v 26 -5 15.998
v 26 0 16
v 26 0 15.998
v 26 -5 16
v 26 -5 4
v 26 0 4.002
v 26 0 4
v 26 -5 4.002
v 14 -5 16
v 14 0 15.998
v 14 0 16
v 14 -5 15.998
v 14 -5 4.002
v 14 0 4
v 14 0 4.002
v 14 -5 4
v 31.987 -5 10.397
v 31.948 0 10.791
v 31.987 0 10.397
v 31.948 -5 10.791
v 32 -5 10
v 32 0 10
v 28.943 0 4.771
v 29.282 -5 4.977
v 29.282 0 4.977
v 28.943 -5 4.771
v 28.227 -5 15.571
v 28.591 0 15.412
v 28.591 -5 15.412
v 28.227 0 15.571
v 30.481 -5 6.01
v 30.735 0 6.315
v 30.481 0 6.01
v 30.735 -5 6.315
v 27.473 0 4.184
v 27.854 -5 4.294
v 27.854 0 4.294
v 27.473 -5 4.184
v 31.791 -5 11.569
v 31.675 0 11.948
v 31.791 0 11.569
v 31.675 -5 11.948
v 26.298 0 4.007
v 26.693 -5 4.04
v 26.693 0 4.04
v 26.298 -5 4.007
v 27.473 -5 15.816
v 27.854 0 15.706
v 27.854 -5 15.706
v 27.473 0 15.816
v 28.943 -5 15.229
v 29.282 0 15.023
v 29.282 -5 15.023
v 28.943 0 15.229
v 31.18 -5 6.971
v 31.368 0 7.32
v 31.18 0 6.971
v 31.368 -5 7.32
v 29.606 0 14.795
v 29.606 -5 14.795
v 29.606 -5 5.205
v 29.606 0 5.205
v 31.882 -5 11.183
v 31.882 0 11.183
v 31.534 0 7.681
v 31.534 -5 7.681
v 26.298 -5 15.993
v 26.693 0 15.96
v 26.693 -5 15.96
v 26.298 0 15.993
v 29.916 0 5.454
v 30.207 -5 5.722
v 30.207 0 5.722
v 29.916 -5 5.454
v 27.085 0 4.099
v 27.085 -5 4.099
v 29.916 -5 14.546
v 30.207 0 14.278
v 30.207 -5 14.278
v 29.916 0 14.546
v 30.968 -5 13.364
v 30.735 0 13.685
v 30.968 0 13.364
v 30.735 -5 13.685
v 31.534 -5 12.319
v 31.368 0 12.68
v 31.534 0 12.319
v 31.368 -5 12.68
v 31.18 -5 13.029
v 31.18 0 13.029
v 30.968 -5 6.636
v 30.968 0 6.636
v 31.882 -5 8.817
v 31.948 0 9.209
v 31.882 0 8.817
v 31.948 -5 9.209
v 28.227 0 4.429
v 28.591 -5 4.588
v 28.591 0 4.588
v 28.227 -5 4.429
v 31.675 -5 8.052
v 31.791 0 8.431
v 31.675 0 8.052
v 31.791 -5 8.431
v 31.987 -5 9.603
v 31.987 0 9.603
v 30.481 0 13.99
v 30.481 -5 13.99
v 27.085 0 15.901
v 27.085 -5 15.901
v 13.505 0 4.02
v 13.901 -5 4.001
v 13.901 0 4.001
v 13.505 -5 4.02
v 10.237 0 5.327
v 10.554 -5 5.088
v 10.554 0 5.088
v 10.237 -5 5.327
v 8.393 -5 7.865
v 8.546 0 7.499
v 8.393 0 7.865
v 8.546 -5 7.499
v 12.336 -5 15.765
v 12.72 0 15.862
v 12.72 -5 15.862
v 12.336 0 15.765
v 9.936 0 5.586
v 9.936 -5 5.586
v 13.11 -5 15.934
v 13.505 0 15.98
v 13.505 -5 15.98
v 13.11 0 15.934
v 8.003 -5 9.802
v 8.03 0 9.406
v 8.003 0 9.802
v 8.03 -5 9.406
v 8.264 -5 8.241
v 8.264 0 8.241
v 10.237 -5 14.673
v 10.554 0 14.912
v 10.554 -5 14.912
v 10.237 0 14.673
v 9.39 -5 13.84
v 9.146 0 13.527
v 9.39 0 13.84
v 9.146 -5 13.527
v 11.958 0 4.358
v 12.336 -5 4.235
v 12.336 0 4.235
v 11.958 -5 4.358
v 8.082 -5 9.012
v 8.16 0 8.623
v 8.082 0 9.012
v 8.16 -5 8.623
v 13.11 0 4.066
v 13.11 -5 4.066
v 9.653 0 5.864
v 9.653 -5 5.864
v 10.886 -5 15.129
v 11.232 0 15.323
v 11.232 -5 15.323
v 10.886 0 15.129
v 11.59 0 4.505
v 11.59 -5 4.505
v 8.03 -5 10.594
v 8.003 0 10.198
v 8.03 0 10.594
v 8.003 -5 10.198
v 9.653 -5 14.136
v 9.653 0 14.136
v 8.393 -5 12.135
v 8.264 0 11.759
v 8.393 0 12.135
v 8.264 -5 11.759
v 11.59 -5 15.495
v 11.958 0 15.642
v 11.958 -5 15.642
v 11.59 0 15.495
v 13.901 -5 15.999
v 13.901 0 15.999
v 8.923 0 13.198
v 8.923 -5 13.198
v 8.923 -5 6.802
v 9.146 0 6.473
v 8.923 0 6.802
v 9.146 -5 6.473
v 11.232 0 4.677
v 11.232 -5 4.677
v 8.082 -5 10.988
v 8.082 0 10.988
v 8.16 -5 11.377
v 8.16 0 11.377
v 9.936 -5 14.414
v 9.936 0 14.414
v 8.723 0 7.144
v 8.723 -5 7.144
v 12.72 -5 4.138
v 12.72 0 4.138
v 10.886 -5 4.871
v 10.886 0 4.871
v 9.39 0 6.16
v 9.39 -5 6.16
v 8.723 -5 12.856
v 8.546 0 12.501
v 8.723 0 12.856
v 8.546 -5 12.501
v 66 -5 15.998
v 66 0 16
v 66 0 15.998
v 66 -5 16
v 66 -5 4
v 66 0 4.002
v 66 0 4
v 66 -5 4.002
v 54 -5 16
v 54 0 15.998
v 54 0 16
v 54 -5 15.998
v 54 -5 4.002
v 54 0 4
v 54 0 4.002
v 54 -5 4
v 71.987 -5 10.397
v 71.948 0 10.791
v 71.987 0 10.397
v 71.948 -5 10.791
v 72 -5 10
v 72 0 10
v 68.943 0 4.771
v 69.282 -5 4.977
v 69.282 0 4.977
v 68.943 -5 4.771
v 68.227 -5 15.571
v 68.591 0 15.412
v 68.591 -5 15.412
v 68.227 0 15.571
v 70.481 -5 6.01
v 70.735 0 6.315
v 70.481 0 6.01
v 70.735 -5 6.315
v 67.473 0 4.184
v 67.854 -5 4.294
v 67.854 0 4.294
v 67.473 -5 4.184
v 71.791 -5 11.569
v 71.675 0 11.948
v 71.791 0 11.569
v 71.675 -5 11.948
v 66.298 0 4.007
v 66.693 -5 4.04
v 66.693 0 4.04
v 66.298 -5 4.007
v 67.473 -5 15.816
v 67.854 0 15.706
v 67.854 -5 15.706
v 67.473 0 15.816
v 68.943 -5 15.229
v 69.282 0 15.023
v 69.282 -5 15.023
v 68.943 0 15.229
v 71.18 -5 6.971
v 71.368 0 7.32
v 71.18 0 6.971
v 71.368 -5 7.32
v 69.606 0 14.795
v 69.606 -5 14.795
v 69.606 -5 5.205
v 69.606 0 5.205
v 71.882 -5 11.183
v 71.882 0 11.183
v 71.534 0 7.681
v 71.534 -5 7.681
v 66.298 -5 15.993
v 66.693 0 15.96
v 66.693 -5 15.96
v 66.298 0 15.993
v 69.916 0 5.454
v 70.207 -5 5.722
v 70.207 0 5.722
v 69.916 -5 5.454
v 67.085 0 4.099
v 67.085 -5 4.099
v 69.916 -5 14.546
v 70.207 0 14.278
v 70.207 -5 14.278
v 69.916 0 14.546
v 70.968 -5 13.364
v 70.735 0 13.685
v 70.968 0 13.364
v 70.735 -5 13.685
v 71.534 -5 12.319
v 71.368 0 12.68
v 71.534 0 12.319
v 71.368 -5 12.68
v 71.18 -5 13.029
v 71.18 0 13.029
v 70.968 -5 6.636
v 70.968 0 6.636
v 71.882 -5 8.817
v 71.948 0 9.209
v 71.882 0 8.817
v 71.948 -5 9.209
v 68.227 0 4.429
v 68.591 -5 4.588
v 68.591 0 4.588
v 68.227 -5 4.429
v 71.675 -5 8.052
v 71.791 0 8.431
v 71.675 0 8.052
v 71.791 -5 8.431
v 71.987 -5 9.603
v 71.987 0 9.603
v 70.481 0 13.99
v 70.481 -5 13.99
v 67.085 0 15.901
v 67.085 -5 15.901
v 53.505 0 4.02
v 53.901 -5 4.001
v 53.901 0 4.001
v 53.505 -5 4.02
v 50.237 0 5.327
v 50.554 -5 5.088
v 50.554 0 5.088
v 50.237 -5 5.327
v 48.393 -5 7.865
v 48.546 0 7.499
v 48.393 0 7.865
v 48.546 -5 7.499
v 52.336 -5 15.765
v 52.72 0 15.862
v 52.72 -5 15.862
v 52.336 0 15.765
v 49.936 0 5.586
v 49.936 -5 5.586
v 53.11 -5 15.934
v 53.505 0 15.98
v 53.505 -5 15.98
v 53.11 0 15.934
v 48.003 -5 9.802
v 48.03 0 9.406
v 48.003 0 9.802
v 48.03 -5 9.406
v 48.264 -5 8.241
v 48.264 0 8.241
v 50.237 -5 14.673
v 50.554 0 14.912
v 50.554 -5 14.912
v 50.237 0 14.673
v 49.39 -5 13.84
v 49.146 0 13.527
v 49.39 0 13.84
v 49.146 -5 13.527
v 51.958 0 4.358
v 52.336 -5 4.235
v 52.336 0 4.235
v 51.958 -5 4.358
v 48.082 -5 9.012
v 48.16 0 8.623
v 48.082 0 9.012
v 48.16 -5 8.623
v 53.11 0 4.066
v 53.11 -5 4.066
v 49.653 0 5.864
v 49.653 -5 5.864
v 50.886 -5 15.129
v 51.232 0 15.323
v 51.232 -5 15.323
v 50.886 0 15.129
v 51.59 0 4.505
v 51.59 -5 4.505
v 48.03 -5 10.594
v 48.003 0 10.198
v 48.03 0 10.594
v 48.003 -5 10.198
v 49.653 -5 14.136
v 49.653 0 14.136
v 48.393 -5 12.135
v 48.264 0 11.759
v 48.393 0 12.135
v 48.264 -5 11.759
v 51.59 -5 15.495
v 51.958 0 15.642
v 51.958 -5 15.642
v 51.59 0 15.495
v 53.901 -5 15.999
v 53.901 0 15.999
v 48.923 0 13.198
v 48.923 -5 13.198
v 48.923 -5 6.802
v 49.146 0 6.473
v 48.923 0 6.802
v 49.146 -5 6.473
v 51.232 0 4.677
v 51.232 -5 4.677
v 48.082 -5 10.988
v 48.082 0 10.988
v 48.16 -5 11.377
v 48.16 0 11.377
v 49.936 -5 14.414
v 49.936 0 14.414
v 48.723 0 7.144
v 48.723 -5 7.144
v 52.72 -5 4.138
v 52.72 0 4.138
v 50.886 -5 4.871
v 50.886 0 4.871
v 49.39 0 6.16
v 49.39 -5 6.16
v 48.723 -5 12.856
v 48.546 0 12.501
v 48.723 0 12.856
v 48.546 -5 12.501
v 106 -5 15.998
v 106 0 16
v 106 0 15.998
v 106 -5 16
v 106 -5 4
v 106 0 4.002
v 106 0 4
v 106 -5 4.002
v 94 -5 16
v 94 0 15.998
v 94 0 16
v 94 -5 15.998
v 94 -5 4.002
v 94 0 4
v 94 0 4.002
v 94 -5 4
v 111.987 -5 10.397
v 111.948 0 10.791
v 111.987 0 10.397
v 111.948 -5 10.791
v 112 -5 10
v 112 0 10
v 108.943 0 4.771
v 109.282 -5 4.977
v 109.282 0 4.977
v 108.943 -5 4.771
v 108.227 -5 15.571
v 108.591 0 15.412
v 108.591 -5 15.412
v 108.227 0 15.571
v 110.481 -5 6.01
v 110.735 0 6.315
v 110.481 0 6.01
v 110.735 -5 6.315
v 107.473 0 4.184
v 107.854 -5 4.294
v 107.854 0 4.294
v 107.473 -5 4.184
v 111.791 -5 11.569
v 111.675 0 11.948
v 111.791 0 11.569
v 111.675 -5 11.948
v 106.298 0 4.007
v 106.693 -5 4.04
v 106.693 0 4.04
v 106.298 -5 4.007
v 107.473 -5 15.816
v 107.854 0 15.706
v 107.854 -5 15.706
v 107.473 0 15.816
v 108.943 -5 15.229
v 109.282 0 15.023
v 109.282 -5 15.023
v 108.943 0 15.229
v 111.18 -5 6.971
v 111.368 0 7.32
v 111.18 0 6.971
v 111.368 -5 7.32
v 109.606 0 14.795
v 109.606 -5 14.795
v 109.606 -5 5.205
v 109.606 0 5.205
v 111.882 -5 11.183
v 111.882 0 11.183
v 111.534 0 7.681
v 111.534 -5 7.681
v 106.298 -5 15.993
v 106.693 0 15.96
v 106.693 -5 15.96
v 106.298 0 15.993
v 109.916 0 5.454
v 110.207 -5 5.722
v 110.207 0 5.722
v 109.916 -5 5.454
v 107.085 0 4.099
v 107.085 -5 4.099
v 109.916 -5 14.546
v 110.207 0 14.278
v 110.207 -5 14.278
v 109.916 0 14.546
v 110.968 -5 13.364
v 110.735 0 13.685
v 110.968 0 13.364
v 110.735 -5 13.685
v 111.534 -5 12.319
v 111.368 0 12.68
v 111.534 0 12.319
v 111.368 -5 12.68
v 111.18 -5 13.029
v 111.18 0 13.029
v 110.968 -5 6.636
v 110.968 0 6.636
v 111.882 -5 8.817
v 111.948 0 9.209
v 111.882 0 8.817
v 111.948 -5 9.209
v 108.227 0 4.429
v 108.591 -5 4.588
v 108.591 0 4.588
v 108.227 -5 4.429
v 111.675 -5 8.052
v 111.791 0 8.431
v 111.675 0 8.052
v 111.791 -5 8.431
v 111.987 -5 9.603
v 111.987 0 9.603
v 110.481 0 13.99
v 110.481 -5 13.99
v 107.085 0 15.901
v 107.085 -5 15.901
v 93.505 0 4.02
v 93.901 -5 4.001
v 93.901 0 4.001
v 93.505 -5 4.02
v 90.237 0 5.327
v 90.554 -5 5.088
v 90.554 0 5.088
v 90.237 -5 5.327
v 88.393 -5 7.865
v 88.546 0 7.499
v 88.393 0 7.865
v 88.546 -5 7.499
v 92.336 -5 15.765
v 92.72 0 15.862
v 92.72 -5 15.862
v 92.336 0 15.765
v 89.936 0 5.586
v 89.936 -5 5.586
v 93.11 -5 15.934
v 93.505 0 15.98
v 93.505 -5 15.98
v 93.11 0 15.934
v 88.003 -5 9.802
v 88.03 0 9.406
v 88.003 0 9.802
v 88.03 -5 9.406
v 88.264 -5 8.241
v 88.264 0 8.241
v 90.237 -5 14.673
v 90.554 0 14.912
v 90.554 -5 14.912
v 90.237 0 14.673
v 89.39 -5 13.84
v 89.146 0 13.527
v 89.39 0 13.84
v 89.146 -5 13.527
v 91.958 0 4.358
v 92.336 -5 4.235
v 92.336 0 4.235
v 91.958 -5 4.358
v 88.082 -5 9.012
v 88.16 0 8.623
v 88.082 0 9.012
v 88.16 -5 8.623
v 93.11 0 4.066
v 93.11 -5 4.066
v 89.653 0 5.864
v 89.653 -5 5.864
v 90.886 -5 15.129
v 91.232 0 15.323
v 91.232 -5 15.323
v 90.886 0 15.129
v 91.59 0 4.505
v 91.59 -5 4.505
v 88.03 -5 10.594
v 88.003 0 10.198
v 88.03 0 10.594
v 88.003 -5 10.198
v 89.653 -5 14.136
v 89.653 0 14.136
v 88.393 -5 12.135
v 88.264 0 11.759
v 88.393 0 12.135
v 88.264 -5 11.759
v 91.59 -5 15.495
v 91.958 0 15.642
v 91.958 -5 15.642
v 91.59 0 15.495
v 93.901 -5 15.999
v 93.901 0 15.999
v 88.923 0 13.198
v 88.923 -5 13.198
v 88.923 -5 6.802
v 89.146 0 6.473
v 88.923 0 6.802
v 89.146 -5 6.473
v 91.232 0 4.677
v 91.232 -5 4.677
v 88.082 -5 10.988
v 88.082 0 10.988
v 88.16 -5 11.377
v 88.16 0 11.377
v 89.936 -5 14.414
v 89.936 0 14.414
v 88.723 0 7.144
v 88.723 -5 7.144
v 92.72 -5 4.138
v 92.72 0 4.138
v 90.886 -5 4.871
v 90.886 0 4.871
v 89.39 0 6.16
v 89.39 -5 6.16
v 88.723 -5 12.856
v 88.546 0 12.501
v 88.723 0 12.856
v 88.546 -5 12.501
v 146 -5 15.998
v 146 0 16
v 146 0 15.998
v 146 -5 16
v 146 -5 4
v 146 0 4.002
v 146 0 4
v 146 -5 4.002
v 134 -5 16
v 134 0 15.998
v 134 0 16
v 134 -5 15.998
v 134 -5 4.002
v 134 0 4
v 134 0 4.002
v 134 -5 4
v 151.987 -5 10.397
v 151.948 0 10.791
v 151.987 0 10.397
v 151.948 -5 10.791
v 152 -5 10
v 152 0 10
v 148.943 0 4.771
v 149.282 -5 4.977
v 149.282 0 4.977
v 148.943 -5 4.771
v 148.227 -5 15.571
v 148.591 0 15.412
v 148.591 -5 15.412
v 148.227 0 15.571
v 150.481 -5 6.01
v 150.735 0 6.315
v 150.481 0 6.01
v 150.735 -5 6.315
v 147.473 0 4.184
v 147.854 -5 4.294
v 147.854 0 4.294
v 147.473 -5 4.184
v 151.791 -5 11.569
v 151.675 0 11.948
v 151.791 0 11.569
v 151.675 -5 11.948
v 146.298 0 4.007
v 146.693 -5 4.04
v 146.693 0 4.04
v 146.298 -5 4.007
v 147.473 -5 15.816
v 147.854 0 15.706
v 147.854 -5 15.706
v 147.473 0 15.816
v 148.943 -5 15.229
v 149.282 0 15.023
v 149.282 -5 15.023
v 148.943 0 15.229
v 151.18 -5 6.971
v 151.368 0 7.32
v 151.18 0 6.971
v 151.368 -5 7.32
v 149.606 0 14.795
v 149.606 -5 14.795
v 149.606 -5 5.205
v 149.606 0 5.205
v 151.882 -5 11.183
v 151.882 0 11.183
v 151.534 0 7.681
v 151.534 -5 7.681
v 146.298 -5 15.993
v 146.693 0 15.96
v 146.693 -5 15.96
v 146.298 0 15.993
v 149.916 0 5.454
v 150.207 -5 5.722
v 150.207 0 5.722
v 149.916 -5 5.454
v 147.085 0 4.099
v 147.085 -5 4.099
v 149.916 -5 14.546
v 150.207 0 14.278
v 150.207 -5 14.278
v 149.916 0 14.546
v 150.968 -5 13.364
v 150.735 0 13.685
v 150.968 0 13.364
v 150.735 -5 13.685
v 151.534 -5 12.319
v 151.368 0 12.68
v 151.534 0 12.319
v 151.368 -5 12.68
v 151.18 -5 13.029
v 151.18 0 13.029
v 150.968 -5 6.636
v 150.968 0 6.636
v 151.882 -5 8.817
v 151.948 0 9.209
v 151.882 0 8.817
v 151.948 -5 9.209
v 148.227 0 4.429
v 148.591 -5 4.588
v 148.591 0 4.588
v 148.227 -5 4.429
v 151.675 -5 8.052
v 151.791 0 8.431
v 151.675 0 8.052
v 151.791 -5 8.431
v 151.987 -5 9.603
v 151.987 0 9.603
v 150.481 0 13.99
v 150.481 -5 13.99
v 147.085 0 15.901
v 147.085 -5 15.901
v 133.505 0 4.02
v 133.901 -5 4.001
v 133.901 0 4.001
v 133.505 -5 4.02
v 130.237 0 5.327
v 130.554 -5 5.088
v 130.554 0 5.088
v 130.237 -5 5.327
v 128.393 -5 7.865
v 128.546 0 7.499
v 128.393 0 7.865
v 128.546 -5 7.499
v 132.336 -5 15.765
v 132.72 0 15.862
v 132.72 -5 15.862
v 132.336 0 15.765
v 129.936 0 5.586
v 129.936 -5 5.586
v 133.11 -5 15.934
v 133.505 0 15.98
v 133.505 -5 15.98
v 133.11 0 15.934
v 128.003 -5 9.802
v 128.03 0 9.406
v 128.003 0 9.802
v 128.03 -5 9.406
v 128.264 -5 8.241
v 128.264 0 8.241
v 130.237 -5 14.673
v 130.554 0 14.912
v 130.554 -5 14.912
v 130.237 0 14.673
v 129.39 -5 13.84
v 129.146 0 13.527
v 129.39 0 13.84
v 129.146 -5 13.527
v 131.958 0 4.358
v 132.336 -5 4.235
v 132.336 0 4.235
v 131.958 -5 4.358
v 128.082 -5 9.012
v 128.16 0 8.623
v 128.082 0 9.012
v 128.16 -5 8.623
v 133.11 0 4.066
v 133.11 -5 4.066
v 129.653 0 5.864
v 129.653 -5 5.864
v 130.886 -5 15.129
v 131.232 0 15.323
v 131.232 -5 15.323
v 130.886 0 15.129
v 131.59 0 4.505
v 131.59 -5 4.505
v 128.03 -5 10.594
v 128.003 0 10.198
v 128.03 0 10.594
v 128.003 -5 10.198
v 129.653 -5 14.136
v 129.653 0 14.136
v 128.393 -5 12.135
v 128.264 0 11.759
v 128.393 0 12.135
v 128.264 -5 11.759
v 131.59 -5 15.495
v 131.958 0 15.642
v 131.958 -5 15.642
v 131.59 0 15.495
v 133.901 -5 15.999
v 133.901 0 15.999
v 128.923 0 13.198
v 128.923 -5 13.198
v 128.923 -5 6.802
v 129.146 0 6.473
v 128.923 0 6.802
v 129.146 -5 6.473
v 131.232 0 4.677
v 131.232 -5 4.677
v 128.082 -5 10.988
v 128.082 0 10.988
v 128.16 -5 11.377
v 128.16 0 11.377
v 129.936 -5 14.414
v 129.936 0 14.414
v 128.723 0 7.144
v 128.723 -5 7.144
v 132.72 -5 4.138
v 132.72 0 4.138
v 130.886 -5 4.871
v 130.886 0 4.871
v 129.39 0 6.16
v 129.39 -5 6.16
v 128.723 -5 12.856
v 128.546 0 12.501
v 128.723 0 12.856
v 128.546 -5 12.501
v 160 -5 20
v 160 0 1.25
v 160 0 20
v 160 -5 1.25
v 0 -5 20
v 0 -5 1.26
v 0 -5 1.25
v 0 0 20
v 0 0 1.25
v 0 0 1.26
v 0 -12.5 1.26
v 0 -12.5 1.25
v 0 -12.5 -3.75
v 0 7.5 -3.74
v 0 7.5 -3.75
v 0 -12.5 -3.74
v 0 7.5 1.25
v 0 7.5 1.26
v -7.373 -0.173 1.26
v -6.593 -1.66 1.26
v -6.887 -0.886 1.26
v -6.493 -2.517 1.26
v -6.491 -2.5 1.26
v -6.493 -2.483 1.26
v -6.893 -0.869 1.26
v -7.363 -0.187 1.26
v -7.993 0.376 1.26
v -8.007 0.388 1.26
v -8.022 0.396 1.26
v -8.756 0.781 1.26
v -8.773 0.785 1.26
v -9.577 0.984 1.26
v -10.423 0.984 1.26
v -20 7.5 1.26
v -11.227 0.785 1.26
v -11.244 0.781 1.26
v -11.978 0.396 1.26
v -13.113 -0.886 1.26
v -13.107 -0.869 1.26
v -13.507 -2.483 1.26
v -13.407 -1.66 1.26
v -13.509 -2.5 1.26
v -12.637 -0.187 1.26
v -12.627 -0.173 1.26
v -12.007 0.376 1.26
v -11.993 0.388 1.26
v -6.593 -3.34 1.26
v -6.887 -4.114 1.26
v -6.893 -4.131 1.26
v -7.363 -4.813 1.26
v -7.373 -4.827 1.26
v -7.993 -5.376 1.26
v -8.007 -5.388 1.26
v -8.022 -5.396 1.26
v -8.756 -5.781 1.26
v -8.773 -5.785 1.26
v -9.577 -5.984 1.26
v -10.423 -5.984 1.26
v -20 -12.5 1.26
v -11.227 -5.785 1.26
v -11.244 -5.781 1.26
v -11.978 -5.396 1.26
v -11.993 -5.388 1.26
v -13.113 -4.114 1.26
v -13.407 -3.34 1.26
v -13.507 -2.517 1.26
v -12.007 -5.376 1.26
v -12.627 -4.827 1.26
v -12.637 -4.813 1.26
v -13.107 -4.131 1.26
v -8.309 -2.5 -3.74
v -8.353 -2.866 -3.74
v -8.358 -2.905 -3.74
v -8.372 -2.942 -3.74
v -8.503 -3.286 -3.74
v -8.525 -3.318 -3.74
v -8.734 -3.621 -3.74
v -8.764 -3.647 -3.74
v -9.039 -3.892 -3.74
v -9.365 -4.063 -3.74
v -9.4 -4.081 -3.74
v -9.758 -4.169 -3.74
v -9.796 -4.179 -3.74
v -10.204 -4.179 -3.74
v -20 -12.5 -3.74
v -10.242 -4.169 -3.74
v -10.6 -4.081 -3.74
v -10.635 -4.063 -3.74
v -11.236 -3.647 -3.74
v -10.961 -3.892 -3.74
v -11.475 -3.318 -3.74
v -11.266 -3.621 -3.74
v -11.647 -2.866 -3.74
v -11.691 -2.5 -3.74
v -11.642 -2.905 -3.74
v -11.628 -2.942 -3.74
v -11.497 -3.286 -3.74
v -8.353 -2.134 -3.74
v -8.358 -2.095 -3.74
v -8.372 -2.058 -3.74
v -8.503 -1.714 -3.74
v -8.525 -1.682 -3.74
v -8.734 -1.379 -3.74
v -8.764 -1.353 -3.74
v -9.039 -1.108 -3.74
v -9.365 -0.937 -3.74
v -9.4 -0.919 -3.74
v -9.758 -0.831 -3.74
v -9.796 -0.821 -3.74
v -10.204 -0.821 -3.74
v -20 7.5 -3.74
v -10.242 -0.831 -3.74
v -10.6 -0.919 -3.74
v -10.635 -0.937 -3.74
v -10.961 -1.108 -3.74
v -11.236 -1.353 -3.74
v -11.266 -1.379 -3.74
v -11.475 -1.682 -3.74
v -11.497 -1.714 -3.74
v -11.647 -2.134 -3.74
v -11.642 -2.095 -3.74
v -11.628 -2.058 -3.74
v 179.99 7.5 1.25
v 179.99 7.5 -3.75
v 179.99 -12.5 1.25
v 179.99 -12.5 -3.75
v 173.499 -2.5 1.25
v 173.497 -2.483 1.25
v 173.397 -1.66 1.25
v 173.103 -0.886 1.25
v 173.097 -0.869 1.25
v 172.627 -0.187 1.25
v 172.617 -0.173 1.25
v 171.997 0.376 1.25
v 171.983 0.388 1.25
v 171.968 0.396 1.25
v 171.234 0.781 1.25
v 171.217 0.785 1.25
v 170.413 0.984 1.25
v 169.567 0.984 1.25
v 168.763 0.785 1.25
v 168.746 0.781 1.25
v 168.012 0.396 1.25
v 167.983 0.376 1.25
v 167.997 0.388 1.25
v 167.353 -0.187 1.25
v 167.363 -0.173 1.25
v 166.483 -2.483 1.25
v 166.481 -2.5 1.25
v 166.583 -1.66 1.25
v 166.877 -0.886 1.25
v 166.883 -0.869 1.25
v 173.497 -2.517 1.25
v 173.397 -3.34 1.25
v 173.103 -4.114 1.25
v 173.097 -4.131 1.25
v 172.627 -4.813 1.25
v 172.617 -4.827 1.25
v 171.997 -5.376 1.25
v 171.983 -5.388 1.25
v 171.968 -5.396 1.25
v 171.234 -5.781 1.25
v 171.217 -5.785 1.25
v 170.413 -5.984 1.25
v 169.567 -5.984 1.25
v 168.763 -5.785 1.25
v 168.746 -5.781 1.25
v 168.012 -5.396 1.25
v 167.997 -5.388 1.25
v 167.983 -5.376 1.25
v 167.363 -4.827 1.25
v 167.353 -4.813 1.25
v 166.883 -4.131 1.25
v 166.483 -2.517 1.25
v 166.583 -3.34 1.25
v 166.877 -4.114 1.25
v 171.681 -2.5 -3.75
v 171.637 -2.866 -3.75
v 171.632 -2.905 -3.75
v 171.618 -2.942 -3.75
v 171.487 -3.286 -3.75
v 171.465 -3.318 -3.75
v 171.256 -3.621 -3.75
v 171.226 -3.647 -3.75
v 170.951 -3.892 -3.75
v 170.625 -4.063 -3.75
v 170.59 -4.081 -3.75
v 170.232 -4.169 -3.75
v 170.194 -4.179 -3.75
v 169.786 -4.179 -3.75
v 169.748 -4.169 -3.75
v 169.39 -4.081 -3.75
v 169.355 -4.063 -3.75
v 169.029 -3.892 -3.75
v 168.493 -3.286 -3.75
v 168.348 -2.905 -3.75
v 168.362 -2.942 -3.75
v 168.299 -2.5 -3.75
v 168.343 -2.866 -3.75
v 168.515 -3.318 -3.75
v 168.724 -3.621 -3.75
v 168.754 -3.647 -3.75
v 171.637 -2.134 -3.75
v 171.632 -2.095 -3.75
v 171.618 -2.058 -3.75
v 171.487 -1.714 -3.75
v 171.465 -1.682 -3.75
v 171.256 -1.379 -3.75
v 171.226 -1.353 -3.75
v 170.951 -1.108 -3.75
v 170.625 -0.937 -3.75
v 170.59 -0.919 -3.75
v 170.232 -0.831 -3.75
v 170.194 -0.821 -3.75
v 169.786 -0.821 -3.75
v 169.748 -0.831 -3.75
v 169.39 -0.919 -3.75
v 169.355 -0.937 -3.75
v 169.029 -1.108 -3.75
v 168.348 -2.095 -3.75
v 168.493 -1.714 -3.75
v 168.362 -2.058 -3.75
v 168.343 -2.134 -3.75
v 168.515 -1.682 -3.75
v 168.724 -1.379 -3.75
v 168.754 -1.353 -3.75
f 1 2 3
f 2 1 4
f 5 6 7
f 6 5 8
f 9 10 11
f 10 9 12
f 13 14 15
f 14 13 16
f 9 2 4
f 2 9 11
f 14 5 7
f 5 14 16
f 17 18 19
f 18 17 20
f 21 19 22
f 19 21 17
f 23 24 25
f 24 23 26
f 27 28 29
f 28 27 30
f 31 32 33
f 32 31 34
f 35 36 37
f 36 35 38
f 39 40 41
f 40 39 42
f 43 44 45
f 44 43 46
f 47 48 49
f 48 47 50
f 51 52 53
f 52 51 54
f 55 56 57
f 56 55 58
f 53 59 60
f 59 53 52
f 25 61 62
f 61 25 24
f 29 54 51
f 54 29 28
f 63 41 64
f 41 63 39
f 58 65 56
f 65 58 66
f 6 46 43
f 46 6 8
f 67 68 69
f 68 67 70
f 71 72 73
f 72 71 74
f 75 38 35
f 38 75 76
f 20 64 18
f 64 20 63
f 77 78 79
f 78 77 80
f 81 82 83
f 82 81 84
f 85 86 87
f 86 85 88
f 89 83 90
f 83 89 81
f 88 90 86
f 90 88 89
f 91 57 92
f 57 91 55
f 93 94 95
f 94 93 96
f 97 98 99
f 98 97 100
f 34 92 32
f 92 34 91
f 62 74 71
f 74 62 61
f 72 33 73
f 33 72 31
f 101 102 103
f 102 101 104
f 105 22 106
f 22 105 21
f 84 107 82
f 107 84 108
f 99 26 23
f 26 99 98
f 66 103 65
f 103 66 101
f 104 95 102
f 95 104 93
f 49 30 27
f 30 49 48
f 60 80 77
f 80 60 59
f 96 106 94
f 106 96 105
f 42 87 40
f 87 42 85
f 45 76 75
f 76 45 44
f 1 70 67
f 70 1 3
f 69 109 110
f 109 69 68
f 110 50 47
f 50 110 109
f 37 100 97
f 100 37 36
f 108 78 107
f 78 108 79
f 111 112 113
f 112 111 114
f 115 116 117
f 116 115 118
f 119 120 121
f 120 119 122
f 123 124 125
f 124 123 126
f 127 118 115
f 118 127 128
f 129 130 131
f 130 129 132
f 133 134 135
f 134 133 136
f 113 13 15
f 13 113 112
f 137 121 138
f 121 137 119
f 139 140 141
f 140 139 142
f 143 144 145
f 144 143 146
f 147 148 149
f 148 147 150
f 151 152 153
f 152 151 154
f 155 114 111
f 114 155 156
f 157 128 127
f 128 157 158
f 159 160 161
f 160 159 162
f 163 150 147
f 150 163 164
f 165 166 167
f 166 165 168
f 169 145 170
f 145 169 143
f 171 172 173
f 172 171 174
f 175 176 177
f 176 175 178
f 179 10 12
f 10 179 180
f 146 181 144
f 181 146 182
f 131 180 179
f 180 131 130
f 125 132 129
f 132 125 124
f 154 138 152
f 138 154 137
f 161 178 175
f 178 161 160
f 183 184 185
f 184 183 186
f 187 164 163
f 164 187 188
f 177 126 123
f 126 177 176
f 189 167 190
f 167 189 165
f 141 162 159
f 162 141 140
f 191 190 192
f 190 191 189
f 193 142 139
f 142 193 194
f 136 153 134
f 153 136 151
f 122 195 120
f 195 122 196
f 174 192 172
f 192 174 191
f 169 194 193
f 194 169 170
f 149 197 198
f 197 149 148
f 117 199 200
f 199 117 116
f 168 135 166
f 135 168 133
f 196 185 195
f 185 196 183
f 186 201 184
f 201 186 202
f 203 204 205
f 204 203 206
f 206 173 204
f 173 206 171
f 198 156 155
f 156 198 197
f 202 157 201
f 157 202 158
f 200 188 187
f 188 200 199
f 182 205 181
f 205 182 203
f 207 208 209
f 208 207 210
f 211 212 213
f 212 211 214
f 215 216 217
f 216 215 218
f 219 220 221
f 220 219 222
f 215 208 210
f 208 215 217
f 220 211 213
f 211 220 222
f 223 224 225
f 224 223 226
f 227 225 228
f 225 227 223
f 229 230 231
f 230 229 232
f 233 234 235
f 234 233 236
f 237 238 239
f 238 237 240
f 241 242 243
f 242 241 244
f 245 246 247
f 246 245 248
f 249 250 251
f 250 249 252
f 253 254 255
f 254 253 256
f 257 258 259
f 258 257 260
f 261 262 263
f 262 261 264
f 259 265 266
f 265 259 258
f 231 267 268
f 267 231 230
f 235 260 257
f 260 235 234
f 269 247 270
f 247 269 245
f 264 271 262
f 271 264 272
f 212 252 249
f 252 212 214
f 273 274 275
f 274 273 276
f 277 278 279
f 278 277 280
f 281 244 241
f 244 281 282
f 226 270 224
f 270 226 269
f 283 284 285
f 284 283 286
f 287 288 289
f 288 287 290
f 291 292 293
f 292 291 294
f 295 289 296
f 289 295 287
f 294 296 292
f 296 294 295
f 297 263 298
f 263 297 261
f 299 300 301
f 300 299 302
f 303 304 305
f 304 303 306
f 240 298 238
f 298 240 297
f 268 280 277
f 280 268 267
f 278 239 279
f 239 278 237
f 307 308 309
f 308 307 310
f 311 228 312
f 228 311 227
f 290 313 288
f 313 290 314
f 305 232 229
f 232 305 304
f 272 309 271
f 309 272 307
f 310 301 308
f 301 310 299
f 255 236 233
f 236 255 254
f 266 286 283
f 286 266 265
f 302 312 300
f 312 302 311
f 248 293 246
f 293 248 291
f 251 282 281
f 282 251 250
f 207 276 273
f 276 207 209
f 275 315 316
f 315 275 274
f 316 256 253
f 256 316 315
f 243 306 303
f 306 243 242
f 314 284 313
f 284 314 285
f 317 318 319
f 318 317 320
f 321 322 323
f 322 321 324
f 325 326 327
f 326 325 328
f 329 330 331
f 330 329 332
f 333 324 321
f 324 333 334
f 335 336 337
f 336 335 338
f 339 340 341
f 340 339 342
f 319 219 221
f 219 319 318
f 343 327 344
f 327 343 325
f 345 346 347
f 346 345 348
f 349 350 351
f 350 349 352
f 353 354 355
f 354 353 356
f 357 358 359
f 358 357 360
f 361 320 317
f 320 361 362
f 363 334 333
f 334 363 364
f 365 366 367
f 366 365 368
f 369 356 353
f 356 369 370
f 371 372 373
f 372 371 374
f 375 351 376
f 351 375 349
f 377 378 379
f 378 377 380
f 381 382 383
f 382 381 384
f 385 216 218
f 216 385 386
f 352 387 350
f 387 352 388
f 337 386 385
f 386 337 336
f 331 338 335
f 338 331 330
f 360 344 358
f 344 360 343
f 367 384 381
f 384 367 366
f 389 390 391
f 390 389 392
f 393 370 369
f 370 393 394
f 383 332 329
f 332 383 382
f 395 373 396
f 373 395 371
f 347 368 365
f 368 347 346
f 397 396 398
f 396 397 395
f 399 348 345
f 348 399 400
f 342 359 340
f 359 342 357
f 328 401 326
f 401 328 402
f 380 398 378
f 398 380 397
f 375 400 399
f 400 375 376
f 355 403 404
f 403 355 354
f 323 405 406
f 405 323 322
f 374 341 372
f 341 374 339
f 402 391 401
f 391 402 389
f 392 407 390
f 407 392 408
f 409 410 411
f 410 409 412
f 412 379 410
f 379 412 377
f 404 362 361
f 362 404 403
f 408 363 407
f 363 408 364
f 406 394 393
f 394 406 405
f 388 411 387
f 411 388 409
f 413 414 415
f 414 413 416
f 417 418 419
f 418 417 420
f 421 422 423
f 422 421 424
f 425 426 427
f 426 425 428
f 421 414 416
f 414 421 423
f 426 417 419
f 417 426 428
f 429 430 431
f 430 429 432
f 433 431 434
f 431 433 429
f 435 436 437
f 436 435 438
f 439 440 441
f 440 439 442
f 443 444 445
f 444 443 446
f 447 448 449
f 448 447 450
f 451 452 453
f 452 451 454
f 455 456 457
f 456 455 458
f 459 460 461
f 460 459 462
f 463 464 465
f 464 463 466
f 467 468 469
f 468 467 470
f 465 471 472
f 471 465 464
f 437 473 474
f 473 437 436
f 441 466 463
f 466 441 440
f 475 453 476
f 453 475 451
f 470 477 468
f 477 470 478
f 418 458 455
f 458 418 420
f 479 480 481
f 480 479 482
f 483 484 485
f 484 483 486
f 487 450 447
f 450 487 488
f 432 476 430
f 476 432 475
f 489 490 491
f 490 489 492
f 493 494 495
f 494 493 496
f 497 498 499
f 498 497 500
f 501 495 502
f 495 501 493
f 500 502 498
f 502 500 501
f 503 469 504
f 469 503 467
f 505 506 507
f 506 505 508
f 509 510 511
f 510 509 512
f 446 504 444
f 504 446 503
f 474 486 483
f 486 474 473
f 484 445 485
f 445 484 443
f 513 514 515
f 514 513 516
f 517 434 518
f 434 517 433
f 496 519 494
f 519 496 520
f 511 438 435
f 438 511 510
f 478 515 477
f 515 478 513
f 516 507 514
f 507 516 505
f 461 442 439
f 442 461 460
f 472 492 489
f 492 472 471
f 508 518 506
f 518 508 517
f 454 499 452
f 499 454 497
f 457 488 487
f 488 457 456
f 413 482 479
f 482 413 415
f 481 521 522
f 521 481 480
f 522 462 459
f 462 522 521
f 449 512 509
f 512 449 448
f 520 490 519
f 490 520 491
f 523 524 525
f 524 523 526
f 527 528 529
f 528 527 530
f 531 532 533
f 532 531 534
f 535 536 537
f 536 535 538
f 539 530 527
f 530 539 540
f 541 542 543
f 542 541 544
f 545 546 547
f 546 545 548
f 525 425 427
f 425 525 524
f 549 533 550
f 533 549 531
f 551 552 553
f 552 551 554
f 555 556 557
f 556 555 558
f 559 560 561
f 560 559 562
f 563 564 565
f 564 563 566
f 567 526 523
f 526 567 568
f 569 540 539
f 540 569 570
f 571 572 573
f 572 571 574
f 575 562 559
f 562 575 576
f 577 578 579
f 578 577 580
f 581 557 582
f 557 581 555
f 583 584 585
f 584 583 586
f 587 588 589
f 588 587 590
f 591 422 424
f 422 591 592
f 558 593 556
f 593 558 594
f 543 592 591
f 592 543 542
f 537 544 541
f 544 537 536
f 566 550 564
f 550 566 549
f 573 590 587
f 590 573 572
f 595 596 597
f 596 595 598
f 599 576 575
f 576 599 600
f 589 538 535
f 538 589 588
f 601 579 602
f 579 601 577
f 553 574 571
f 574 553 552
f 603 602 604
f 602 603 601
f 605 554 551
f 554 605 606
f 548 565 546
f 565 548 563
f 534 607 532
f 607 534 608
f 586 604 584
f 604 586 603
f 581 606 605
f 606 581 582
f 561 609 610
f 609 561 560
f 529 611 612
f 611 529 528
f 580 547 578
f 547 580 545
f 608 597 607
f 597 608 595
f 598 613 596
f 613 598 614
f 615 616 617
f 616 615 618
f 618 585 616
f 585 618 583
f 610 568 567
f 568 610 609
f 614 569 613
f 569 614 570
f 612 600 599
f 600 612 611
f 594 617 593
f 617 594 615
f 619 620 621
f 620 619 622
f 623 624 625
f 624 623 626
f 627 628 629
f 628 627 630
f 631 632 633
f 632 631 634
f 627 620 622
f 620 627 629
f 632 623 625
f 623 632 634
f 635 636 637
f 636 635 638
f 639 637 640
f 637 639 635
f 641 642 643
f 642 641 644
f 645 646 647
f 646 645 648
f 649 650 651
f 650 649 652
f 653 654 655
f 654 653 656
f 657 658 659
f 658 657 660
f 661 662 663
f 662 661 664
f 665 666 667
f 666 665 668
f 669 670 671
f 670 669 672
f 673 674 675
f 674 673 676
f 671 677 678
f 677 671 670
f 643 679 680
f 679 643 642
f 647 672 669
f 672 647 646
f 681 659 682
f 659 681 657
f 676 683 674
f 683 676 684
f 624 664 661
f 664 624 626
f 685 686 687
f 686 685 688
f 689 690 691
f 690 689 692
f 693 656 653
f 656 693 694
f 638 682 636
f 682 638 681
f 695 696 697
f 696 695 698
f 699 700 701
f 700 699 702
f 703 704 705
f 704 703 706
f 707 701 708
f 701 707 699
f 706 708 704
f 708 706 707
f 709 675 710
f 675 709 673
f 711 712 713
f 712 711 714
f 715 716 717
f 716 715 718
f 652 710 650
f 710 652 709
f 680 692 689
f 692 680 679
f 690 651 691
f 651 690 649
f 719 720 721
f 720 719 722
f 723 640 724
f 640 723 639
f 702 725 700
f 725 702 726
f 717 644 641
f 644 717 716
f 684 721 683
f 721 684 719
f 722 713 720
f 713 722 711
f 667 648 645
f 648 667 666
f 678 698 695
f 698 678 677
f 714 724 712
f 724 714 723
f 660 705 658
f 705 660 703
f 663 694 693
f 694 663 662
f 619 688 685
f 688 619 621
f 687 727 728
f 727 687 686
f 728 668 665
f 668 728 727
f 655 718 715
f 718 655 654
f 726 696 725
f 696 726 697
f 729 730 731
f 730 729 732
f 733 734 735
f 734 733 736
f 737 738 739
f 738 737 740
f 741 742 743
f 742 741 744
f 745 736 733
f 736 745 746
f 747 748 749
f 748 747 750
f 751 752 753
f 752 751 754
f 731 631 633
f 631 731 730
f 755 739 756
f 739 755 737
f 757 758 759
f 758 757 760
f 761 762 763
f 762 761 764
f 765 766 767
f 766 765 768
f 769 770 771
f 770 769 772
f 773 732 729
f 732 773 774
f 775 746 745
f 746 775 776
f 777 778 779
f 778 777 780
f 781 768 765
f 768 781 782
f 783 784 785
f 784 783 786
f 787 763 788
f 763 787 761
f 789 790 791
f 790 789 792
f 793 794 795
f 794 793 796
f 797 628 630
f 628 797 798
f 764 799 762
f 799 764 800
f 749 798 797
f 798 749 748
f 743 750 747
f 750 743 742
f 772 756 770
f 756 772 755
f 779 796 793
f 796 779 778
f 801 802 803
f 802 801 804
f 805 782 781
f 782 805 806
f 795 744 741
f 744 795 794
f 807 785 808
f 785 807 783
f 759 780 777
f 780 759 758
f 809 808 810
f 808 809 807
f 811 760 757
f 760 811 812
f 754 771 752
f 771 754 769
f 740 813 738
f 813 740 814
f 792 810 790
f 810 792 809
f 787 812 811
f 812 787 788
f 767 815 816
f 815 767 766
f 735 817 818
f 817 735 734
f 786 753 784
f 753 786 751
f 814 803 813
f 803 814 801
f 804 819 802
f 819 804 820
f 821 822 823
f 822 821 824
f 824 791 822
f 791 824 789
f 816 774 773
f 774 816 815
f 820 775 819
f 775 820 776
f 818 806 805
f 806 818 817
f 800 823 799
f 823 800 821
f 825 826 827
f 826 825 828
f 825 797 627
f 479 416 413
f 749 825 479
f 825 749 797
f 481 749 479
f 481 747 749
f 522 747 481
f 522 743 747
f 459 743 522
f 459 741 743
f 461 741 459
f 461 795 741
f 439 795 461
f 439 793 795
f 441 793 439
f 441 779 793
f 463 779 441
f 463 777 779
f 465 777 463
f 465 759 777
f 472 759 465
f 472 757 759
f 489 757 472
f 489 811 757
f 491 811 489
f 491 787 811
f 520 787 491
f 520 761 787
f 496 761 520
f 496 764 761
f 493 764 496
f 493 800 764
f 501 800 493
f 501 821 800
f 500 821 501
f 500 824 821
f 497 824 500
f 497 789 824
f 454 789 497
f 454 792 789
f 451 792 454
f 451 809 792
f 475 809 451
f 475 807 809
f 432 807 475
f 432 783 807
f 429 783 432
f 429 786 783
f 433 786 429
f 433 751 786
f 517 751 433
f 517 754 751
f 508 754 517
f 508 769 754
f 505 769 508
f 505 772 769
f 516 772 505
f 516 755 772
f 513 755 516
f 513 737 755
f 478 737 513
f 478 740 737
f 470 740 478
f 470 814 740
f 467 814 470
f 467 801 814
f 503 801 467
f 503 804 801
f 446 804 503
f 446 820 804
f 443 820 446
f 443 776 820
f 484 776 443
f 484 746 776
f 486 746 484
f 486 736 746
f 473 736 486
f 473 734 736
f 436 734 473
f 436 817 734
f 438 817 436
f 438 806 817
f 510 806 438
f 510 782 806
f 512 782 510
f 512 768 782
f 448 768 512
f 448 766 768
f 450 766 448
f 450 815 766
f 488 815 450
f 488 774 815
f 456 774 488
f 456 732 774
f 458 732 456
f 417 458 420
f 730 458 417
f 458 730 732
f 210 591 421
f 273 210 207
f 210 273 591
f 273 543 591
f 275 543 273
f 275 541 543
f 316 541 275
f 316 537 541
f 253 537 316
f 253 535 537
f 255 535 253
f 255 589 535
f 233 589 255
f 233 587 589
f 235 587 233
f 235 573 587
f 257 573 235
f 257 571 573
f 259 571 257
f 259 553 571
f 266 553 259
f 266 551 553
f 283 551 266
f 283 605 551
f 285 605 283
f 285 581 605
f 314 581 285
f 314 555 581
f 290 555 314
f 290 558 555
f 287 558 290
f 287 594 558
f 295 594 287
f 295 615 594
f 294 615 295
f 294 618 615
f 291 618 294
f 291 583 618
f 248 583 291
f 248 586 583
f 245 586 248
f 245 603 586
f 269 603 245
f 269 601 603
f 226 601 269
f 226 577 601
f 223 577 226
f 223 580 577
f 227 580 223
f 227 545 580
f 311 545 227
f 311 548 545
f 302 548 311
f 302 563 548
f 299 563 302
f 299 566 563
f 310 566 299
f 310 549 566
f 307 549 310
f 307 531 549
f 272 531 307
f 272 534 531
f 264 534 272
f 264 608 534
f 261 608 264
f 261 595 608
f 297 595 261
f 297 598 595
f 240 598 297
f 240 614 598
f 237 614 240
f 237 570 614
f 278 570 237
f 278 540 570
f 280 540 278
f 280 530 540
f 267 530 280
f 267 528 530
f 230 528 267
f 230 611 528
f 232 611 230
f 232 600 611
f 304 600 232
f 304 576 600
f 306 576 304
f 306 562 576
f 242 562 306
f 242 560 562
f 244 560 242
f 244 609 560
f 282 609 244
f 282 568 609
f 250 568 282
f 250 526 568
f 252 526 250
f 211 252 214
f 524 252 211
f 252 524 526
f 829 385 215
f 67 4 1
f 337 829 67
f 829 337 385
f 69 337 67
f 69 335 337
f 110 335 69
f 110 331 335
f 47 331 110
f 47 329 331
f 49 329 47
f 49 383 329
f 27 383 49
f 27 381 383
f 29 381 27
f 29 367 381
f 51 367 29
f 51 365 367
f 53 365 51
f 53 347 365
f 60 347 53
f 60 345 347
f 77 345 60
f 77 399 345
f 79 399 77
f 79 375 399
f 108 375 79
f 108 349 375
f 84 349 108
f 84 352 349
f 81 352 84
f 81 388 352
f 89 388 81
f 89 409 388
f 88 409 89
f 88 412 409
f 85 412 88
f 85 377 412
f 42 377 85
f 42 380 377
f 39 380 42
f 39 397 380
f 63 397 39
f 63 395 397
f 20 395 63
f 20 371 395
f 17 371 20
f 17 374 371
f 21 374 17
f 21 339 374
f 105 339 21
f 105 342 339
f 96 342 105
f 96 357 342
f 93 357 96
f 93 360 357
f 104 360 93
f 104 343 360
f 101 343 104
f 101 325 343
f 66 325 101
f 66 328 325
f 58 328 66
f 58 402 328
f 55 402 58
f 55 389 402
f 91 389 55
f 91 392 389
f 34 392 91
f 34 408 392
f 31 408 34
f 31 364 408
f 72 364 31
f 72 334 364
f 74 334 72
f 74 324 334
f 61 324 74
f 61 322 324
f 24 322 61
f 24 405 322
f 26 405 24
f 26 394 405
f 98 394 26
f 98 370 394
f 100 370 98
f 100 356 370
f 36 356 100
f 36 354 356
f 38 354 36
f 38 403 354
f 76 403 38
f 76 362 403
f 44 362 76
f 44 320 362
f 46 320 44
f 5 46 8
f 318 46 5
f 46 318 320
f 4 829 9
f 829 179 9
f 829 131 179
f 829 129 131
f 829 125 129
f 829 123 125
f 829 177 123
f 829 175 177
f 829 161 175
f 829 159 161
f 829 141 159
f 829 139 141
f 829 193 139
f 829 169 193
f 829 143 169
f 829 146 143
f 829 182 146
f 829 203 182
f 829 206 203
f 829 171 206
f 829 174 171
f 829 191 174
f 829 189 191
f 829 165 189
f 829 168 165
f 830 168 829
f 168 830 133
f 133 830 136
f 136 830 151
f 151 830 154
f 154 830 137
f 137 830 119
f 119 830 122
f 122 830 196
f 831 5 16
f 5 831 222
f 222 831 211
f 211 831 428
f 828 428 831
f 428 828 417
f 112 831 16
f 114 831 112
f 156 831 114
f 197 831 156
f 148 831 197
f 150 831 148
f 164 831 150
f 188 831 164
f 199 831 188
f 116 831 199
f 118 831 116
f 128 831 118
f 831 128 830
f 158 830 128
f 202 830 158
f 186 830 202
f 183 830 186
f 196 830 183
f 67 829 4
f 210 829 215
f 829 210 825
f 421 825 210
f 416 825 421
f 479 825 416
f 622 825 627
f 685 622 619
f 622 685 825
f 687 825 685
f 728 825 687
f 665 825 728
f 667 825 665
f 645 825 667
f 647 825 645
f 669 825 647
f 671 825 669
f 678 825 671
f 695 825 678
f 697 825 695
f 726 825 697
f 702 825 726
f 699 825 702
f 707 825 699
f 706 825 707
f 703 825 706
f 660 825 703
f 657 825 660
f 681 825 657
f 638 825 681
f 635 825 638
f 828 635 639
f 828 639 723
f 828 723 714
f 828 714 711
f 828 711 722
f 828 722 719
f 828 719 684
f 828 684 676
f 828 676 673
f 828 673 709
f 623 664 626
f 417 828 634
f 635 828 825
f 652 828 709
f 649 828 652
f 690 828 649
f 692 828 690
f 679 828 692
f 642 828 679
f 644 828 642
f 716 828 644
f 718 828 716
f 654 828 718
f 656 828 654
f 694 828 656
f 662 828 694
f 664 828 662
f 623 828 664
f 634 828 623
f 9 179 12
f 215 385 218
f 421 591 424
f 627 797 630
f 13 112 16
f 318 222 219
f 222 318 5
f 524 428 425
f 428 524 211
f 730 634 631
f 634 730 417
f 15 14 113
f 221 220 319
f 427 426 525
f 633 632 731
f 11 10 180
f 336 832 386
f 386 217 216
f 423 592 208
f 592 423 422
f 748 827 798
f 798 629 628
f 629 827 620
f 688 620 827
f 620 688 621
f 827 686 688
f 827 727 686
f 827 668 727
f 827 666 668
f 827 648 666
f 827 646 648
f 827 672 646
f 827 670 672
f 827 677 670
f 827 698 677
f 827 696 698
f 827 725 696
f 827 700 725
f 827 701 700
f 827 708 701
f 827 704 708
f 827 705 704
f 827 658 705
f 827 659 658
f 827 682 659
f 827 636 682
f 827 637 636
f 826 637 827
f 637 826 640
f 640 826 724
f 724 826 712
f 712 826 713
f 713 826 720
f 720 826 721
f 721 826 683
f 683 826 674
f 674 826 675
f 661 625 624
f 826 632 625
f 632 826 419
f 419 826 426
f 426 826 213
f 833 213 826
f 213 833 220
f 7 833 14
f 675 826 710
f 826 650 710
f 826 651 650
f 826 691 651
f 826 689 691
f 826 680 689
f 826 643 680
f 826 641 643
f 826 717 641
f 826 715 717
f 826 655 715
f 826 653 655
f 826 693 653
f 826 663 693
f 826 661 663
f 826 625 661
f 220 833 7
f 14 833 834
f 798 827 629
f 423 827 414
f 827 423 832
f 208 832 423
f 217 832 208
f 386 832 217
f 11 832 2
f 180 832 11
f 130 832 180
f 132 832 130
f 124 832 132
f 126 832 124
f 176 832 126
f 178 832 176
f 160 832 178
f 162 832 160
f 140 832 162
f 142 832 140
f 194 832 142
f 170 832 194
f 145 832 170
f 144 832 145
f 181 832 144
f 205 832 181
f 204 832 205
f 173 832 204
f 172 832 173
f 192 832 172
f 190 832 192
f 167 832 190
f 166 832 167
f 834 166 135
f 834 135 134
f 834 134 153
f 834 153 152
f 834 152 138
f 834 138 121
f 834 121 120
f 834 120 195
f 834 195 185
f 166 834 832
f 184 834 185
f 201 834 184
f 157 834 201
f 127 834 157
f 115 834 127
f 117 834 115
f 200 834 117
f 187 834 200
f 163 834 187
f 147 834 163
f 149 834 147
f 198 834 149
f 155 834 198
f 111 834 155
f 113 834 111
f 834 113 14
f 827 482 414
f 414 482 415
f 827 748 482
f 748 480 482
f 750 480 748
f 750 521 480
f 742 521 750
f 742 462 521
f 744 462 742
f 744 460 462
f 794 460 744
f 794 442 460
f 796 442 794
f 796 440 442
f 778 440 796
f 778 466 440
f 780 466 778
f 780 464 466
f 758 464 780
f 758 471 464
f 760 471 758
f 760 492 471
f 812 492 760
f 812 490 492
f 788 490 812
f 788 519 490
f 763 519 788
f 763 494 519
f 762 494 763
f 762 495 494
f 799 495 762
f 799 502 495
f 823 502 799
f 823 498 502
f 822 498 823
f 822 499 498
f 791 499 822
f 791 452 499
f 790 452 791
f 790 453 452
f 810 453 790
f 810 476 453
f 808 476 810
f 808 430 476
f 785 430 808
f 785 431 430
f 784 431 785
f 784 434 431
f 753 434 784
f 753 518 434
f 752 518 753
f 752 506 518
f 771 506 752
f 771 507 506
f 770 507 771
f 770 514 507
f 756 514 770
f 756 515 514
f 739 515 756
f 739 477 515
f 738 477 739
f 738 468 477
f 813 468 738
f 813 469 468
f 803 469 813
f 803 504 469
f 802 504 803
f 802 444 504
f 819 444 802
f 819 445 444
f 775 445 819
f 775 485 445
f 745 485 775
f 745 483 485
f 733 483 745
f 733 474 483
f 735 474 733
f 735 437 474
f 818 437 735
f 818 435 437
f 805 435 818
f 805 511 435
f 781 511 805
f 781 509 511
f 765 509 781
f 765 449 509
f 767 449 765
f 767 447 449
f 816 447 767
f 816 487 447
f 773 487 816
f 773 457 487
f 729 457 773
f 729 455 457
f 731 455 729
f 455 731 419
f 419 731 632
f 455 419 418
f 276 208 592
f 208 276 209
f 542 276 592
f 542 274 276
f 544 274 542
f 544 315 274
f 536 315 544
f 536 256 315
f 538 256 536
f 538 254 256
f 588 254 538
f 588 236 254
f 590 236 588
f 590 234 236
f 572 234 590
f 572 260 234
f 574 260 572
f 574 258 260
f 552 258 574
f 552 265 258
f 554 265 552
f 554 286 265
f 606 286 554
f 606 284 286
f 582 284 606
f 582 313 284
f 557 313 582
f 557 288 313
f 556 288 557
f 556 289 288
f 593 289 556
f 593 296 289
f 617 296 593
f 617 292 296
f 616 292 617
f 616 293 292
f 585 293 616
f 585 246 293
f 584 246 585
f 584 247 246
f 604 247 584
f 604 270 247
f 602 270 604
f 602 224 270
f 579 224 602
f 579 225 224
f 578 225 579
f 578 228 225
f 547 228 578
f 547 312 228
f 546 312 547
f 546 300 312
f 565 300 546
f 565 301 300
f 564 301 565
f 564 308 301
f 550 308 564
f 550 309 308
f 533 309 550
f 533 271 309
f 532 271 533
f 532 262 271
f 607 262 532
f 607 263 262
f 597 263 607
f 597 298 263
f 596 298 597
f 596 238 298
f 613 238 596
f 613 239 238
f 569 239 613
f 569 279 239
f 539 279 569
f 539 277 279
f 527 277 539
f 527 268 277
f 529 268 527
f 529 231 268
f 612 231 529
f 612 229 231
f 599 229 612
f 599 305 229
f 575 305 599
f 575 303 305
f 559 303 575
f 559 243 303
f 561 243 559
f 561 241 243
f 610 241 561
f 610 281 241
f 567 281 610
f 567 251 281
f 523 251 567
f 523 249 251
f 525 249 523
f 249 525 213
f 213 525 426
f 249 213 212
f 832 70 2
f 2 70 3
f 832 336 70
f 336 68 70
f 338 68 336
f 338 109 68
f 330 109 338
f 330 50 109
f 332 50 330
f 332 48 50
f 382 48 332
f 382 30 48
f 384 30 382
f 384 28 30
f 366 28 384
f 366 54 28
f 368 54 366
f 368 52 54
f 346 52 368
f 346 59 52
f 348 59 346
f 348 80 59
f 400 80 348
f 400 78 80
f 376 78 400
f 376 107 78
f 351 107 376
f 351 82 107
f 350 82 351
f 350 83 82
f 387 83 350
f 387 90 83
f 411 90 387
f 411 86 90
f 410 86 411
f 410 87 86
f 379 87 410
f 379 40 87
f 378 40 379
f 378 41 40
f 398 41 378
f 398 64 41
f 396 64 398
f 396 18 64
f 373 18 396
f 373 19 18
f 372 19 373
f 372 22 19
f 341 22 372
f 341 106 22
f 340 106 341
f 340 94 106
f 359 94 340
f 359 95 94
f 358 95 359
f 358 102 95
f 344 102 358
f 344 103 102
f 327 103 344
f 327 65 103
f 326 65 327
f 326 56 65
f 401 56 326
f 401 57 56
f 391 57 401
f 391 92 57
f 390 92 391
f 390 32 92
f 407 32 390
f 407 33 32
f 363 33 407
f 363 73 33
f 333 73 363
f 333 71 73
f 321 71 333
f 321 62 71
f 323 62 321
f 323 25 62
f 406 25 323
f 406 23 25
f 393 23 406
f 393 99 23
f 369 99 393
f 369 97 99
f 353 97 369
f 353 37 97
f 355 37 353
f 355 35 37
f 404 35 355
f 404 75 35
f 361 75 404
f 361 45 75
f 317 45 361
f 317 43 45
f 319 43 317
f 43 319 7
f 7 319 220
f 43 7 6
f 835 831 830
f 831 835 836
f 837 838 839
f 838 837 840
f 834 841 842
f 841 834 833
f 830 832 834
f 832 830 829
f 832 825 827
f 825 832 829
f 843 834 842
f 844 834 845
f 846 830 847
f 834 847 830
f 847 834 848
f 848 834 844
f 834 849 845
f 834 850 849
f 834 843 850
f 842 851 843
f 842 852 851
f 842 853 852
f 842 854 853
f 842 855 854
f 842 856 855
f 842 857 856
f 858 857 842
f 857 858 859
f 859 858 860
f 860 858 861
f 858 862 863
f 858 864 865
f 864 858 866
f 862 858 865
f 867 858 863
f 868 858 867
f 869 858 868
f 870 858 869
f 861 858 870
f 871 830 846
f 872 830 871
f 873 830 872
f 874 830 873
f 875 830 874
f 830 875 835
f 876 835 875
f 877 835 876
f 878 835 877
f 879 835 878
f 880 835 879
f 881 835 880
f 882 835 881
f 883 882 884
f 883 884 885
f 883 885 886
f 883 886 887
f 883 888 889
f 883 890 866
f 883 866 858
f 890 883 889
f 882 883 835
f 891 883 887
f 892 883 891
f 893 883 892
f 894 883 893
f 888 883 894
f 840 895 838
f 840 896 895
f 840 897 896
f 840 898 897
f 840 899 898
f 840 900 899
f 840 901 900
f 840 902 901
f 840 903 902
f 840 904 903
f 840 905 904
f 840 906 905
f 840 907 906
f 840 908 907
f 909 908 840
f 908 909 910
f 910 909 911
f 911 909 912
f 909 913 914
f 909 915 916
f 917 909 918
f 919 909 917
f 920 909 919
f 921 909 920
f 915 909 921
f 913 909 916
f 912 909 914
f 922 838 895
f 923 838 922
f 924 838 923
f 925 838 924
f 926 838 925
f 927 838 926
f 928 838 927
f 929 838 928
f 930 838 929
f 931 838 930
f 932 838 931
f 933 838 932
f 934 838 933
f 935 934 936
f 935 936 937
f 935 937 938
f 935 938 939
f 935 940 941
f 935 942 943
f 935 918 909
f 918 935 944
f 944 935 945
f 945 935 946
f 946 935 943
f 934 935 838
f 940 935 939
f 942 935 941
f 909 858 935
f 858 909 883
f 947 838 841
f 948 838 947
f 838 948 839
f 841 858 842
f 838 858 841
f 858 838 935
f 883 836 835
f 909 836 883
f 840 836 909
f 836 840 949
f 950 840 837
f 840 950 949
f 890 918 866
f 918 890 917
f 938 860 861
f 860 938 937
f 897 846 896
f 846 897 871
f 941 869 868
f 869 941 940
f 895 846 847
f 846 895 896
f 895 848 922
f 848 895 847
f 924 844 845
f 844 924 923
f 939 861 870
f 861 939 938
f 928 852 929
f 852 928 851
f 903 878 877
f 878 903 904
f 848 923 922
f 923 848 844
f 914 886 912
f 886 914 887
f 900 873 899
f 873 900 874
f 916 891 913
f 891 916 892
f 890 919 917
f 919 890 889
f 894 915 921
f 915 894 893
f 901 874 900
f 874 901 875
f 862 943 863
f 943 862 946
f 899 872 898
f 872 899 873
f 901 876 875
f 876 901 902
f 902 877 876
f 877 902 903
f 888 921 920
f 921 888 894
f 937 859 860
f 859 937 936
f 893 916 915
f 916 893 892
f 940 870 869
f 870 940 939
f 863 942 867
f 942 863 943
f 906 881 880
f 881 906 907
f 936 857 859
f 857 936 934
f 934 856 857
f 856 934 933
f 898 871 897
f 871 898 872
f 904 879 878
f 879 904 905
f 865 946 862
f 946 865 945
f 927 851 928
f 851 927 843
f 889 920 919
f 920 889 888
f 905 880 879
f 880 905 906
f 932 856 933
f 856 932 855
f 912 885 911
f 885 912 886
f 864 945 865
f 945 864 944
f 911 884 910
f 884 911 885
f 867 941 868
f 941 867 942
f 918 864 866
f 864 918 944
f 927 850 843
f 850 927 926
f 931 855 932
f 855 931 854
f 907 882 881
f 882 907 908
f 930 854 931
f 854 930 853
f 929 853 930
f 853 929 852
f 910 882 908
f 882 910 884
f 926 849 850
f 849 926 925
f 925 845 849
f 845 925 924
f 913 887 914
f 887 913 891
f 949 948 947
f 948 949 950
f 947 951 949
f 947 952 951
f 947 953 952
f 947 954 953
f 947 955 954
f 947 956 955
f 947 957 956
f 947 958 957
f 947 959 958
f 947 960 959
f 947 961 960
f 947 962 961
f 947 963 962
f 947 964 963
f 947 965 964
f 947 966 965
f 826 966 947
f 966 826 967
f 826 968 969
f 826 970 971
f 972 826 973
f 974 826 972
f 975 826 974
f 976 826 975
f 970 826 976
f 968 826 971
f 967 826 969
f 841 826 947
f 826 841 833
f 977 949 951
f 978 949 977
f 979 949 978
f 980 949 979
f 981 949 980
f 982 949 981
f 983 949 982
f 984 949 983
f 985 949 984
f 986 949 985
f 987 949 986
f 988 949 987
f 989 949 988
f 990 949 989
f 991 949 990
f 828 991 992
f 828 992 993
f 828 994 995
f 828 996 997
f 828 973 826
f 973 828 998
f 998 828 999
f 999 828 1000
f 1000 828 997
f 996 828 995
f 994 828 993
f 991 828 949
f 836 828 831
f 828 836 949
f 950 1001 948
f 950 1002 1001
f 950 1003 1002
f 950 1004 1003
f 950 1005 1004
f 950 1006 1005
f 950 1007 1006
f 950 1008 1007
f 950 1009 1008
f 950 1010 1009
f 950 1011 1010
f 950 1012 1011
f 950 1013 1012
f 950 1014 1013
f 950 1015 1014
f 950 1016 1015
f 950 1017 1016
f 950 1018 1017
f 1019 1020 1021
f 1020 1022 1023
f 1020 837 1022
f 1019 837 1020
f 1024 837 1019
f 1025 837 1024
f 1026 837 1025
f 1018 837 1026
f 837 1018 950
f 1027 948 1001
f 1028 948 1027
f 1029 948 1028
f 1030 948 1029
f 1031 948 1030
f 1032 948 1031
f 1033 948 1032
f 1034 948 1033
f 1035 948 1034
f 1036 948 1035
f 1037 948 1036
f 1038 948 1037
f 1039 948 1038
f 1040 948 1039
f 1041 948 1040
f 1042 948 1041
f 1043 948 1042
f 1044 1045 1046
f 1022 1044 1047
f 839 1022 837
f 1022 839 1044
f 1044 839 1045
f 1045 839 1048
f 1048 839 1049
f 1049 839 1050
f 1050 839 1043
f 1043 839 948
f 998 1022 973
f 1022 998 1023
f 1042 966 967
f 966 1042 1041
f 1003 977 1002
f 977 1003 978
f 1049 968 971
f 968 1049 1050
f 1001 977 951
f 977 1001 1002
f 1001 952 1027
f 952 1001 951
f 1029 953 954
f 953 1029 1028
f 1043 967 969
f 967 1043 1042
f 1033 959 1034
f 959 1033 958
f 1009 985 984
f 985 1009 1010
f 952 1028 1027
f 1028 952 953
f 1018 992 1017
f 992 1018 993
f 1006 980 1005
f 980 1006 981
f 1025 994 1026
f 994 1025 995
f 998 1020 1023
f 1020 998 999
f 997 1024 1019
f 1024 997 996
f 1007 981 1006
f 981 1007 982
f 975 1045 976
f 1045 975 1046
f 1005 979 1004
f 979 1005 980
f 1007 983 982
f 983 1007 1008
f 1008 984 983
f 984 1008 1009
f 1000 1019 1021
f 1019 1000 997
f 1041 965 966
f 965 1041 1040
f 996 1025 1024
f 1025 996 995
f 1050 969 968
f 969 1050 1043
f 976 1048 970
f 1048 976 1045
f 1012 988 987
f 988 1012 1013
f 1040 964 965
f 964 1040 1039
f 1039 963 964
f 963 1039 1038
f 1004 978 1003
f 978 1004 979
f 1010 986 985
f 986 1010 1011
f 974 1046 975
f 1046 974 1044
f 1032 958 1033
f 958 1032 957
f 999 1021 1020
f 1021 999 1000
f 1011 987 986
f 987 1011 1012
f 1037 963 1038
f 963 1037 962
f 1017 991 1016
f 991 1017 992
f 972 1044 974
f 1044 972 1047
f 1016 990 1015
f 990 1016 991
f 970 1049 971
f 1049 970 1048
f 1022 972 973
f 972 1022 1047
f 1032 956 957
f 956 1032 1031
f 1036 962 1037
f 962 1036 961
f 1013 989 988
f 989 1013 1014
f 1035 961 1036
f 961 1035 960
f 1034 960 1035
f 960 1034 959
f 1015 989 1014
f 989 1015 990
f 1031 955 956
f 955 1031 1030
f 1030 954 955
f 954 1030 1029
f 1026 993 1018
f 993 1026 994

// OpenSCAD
// file: parts/countersink.scad
module countersink(base_radius = 2, top_radius = 1.6, height = 2) {
    scale_ration = top_radius / base_radius;
    linear_extrude(height,center=true, scale=scale_ration) {
        circle(base_radius);
    }
}

countersink();
// main file
use <parts/countersink.scad>

$fa = 1;
$fs = 0.4;
eps = 0.01;

length = 160;
width = 20;
span = 20;
depth = 5;
dx = 40;
radius = 15;
n_holes = max(1, floor(length / dx));
side_dx = (length - (n_holes-1) * dx) / 2;

module hole(length = 10, height = 5, depth = 5) {
    cube([length, height, depth], center=true);
    translate([length/2,0,0]) cylinder(h=depth, r= height/2, center=true);
    translate([-length/2,0,0]) cylinder(h=depth, r= height/2, center=true);
}

module holder() {
    difference() {
        cube([length, width, depth]);

        for ( i = [1:n_holes]) {
            translate([side_dx + (i-1)*dx, width/2, depth/2])
            hole(depth=depth*2, height=12, length=12);
           
        }
    }
}

module side() {
    rotate([-90, 0,0])
    difference() {
        cube([width, width, depth], center=true);
        countersink(height=depth*1.1, base_radius=1.6, top_radius =3.6);
    }
}

rotate([90, 0, 0]) {
    holder();
    translate([0, -3*depth/4, -span/2+depth/2]) cube([length, depth, span]);
    translate([-width/2, -depth/4 + eps, depth/2]) side();
    translate([length+width/2-eps, -depth/4, depth/2]) side();
}
